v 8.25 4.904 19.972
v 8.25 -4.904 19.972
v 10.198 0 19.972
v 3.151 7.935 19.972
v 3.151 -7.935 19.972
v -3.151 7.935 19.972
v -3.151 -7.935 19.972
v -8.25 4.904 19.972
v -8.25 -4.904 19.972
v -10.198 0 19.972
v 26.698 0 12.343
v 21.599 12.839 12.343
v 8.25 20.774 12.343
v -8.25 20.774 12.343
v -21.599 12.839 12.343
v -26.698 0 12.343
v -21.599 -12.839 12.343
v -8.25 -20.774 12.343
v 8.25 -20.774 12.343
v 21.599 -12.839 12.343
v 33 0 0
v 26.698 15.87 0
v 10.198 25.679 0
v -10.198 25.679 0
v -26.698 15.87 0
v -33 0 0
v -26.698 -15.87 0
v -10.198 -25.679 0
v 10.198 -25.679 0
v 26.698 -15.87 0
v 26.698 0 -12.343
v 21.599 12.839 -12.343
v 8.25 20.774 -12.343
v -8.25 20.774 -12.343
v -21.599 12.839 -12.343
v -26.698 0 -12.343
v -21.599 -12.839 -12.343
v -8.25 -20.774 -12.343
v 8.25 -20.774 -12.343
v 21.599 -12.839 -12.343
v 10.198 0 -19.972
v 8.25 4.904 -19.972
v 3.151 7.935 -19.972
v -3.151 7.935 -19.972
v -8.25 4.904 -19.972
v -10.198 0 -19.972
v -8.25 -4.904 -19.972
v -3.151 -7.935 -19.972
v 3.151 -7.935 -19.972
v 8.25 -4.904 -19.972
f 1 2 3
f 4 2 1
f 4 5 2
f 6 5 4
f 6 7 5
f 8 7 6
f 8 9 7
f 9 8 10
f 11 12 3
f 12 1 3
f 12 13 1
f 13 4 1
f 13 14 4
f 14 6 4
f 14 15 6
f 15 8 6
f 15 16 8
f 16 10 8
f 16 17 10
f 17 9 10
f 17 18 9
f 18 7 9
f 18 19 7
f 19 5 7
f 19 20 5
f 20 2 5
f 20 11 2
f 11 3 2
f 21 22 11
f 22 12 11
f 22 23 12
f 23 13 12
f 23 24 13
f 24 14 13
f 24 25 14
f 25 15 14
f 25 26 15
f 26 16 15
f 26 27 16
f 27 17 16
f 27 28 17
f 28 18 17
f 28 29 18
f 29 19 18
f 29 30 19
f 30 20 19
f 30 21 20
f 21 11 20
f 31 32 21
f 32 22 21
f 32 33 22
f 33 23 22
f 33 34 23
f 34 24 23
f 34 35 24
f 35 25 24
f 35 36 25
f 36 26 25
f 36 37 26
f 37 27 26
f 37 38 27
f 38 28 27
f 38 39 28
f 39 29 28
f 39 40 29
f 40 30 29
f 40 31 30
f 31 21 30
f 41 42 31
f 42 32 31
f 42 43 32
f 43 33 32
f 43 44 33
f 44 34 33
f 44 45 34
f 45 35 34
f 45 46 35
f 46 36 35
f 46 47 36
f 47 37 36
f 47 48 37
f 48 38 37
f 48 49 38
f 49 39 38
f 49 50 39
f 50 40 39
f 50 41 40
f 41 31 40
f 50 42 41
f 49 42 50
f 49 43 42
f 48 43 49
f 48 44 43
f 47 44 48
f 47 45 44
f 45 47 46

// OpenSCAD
// Generated by SolidPython 1.0.1 on 2020-07-29 00:46:49


scale(v = [11, 9, 7]) {
	sphere(r = 3);
}
/***********************************************
*********      SolidPython code:      **********
************************************************
 
# import packages: SolidPython
from solid import *
from solid.utils import *
from itertools import chain, combinations, permutations


class Resize:

    def __init__(self, scad_file):
        self.scad_file = scad_file
        #self.scad_file = import_scad(scad_file)
        # cone/cylinder param:
        self.r1 = 0
        self.r2 = 0
        self.h = 0
        # rectangular prism param:
        self.w = 0
        self.l = 0
        # ellipse param:
        self.r = 0

    # import OpenScad code (file name corresponds to shape)


    # classify shape + parameters
    def assign(self, param1, param2, param3):
        if self.scad_file == 'cone.scad':
            self.r1 = param1
            self.r2 = param2
            self.h = param3
        elif self.scad_file == 'cylinder.scad':
            self.r1 = param1
            self.r2 = param2
            self.h = param3
        elif self.scad_file == 'rectangularPrism.scad':
            self.h = param1
            self.l = param2
            self.w = param3
        else:
            self.r = param1
            self.h = param2

    # resize parameters
    def iterate(self):
        x = range(3, 20, 2)
        i = 1
        if self.scad_file == 'cone.scad':
            tempList = list(permutations(x, 2))
            for temp in tempList:
                param1 = temp[0]
                param2 = temp[1]
                filepath = 'produced_scad_files/' + 'cone' + str(param1) + '_' + str(param2) + '_' + '.scad'
                scad_render_to_file(cylinder(h=param1, r1=param2, r2=0), filepath)

        elif self.scad_file == 'cylinder.scad':
            tempList = list(permutations(x, 3))
            for temp in tempList:
                param1 = temp[0]
                param2 = temp[1]
                filepath = 'produced_scad_files/' + 'cylinder' + str(param1) + '_' + str(param2) + '_' + '.scad'
                scad_render_to_file(cylinder(h=param1, r1=param2, r2=param2), filepath)

        elif self.scad_file == 'rectangularPrism.scad':
            tempList = list(permutations(x, 3))
            for temp in tempList:
                param1 = temp[0]
                param2 = temp[1]
                param3 = temp[2]
                filepath = 'produced_scad_files/' + 'rectangularPrism' + str(param1) + '_' + str(param2) + '_' + str(
                    param3) + '.scad'
                scad_render_to_file(cube(size=(param1, param2, param3)), filepath)

        elif self.scad_file == 'ellipse.scad':
            tempList = list(permutations(x, 4))
            for temp in tempList:
                param1 = temp[0]
                param2 = temp[1]
                param3 = temp[2]
                param4 = temp[3]
                filepath = 'produced_scad_files/' + 'ellipse' + str(param1) + '_' + str(param2) + '_' + str(param3) + '_' + str(param4) + '.scad'
                scad_render_to_file(scale([param1, param2, param3])(sphere(r=param4)), filepath)

    def render_to_scadfile(self):
        scad_render_to_file(scad, 'example.scad') 
 
************************************************/
